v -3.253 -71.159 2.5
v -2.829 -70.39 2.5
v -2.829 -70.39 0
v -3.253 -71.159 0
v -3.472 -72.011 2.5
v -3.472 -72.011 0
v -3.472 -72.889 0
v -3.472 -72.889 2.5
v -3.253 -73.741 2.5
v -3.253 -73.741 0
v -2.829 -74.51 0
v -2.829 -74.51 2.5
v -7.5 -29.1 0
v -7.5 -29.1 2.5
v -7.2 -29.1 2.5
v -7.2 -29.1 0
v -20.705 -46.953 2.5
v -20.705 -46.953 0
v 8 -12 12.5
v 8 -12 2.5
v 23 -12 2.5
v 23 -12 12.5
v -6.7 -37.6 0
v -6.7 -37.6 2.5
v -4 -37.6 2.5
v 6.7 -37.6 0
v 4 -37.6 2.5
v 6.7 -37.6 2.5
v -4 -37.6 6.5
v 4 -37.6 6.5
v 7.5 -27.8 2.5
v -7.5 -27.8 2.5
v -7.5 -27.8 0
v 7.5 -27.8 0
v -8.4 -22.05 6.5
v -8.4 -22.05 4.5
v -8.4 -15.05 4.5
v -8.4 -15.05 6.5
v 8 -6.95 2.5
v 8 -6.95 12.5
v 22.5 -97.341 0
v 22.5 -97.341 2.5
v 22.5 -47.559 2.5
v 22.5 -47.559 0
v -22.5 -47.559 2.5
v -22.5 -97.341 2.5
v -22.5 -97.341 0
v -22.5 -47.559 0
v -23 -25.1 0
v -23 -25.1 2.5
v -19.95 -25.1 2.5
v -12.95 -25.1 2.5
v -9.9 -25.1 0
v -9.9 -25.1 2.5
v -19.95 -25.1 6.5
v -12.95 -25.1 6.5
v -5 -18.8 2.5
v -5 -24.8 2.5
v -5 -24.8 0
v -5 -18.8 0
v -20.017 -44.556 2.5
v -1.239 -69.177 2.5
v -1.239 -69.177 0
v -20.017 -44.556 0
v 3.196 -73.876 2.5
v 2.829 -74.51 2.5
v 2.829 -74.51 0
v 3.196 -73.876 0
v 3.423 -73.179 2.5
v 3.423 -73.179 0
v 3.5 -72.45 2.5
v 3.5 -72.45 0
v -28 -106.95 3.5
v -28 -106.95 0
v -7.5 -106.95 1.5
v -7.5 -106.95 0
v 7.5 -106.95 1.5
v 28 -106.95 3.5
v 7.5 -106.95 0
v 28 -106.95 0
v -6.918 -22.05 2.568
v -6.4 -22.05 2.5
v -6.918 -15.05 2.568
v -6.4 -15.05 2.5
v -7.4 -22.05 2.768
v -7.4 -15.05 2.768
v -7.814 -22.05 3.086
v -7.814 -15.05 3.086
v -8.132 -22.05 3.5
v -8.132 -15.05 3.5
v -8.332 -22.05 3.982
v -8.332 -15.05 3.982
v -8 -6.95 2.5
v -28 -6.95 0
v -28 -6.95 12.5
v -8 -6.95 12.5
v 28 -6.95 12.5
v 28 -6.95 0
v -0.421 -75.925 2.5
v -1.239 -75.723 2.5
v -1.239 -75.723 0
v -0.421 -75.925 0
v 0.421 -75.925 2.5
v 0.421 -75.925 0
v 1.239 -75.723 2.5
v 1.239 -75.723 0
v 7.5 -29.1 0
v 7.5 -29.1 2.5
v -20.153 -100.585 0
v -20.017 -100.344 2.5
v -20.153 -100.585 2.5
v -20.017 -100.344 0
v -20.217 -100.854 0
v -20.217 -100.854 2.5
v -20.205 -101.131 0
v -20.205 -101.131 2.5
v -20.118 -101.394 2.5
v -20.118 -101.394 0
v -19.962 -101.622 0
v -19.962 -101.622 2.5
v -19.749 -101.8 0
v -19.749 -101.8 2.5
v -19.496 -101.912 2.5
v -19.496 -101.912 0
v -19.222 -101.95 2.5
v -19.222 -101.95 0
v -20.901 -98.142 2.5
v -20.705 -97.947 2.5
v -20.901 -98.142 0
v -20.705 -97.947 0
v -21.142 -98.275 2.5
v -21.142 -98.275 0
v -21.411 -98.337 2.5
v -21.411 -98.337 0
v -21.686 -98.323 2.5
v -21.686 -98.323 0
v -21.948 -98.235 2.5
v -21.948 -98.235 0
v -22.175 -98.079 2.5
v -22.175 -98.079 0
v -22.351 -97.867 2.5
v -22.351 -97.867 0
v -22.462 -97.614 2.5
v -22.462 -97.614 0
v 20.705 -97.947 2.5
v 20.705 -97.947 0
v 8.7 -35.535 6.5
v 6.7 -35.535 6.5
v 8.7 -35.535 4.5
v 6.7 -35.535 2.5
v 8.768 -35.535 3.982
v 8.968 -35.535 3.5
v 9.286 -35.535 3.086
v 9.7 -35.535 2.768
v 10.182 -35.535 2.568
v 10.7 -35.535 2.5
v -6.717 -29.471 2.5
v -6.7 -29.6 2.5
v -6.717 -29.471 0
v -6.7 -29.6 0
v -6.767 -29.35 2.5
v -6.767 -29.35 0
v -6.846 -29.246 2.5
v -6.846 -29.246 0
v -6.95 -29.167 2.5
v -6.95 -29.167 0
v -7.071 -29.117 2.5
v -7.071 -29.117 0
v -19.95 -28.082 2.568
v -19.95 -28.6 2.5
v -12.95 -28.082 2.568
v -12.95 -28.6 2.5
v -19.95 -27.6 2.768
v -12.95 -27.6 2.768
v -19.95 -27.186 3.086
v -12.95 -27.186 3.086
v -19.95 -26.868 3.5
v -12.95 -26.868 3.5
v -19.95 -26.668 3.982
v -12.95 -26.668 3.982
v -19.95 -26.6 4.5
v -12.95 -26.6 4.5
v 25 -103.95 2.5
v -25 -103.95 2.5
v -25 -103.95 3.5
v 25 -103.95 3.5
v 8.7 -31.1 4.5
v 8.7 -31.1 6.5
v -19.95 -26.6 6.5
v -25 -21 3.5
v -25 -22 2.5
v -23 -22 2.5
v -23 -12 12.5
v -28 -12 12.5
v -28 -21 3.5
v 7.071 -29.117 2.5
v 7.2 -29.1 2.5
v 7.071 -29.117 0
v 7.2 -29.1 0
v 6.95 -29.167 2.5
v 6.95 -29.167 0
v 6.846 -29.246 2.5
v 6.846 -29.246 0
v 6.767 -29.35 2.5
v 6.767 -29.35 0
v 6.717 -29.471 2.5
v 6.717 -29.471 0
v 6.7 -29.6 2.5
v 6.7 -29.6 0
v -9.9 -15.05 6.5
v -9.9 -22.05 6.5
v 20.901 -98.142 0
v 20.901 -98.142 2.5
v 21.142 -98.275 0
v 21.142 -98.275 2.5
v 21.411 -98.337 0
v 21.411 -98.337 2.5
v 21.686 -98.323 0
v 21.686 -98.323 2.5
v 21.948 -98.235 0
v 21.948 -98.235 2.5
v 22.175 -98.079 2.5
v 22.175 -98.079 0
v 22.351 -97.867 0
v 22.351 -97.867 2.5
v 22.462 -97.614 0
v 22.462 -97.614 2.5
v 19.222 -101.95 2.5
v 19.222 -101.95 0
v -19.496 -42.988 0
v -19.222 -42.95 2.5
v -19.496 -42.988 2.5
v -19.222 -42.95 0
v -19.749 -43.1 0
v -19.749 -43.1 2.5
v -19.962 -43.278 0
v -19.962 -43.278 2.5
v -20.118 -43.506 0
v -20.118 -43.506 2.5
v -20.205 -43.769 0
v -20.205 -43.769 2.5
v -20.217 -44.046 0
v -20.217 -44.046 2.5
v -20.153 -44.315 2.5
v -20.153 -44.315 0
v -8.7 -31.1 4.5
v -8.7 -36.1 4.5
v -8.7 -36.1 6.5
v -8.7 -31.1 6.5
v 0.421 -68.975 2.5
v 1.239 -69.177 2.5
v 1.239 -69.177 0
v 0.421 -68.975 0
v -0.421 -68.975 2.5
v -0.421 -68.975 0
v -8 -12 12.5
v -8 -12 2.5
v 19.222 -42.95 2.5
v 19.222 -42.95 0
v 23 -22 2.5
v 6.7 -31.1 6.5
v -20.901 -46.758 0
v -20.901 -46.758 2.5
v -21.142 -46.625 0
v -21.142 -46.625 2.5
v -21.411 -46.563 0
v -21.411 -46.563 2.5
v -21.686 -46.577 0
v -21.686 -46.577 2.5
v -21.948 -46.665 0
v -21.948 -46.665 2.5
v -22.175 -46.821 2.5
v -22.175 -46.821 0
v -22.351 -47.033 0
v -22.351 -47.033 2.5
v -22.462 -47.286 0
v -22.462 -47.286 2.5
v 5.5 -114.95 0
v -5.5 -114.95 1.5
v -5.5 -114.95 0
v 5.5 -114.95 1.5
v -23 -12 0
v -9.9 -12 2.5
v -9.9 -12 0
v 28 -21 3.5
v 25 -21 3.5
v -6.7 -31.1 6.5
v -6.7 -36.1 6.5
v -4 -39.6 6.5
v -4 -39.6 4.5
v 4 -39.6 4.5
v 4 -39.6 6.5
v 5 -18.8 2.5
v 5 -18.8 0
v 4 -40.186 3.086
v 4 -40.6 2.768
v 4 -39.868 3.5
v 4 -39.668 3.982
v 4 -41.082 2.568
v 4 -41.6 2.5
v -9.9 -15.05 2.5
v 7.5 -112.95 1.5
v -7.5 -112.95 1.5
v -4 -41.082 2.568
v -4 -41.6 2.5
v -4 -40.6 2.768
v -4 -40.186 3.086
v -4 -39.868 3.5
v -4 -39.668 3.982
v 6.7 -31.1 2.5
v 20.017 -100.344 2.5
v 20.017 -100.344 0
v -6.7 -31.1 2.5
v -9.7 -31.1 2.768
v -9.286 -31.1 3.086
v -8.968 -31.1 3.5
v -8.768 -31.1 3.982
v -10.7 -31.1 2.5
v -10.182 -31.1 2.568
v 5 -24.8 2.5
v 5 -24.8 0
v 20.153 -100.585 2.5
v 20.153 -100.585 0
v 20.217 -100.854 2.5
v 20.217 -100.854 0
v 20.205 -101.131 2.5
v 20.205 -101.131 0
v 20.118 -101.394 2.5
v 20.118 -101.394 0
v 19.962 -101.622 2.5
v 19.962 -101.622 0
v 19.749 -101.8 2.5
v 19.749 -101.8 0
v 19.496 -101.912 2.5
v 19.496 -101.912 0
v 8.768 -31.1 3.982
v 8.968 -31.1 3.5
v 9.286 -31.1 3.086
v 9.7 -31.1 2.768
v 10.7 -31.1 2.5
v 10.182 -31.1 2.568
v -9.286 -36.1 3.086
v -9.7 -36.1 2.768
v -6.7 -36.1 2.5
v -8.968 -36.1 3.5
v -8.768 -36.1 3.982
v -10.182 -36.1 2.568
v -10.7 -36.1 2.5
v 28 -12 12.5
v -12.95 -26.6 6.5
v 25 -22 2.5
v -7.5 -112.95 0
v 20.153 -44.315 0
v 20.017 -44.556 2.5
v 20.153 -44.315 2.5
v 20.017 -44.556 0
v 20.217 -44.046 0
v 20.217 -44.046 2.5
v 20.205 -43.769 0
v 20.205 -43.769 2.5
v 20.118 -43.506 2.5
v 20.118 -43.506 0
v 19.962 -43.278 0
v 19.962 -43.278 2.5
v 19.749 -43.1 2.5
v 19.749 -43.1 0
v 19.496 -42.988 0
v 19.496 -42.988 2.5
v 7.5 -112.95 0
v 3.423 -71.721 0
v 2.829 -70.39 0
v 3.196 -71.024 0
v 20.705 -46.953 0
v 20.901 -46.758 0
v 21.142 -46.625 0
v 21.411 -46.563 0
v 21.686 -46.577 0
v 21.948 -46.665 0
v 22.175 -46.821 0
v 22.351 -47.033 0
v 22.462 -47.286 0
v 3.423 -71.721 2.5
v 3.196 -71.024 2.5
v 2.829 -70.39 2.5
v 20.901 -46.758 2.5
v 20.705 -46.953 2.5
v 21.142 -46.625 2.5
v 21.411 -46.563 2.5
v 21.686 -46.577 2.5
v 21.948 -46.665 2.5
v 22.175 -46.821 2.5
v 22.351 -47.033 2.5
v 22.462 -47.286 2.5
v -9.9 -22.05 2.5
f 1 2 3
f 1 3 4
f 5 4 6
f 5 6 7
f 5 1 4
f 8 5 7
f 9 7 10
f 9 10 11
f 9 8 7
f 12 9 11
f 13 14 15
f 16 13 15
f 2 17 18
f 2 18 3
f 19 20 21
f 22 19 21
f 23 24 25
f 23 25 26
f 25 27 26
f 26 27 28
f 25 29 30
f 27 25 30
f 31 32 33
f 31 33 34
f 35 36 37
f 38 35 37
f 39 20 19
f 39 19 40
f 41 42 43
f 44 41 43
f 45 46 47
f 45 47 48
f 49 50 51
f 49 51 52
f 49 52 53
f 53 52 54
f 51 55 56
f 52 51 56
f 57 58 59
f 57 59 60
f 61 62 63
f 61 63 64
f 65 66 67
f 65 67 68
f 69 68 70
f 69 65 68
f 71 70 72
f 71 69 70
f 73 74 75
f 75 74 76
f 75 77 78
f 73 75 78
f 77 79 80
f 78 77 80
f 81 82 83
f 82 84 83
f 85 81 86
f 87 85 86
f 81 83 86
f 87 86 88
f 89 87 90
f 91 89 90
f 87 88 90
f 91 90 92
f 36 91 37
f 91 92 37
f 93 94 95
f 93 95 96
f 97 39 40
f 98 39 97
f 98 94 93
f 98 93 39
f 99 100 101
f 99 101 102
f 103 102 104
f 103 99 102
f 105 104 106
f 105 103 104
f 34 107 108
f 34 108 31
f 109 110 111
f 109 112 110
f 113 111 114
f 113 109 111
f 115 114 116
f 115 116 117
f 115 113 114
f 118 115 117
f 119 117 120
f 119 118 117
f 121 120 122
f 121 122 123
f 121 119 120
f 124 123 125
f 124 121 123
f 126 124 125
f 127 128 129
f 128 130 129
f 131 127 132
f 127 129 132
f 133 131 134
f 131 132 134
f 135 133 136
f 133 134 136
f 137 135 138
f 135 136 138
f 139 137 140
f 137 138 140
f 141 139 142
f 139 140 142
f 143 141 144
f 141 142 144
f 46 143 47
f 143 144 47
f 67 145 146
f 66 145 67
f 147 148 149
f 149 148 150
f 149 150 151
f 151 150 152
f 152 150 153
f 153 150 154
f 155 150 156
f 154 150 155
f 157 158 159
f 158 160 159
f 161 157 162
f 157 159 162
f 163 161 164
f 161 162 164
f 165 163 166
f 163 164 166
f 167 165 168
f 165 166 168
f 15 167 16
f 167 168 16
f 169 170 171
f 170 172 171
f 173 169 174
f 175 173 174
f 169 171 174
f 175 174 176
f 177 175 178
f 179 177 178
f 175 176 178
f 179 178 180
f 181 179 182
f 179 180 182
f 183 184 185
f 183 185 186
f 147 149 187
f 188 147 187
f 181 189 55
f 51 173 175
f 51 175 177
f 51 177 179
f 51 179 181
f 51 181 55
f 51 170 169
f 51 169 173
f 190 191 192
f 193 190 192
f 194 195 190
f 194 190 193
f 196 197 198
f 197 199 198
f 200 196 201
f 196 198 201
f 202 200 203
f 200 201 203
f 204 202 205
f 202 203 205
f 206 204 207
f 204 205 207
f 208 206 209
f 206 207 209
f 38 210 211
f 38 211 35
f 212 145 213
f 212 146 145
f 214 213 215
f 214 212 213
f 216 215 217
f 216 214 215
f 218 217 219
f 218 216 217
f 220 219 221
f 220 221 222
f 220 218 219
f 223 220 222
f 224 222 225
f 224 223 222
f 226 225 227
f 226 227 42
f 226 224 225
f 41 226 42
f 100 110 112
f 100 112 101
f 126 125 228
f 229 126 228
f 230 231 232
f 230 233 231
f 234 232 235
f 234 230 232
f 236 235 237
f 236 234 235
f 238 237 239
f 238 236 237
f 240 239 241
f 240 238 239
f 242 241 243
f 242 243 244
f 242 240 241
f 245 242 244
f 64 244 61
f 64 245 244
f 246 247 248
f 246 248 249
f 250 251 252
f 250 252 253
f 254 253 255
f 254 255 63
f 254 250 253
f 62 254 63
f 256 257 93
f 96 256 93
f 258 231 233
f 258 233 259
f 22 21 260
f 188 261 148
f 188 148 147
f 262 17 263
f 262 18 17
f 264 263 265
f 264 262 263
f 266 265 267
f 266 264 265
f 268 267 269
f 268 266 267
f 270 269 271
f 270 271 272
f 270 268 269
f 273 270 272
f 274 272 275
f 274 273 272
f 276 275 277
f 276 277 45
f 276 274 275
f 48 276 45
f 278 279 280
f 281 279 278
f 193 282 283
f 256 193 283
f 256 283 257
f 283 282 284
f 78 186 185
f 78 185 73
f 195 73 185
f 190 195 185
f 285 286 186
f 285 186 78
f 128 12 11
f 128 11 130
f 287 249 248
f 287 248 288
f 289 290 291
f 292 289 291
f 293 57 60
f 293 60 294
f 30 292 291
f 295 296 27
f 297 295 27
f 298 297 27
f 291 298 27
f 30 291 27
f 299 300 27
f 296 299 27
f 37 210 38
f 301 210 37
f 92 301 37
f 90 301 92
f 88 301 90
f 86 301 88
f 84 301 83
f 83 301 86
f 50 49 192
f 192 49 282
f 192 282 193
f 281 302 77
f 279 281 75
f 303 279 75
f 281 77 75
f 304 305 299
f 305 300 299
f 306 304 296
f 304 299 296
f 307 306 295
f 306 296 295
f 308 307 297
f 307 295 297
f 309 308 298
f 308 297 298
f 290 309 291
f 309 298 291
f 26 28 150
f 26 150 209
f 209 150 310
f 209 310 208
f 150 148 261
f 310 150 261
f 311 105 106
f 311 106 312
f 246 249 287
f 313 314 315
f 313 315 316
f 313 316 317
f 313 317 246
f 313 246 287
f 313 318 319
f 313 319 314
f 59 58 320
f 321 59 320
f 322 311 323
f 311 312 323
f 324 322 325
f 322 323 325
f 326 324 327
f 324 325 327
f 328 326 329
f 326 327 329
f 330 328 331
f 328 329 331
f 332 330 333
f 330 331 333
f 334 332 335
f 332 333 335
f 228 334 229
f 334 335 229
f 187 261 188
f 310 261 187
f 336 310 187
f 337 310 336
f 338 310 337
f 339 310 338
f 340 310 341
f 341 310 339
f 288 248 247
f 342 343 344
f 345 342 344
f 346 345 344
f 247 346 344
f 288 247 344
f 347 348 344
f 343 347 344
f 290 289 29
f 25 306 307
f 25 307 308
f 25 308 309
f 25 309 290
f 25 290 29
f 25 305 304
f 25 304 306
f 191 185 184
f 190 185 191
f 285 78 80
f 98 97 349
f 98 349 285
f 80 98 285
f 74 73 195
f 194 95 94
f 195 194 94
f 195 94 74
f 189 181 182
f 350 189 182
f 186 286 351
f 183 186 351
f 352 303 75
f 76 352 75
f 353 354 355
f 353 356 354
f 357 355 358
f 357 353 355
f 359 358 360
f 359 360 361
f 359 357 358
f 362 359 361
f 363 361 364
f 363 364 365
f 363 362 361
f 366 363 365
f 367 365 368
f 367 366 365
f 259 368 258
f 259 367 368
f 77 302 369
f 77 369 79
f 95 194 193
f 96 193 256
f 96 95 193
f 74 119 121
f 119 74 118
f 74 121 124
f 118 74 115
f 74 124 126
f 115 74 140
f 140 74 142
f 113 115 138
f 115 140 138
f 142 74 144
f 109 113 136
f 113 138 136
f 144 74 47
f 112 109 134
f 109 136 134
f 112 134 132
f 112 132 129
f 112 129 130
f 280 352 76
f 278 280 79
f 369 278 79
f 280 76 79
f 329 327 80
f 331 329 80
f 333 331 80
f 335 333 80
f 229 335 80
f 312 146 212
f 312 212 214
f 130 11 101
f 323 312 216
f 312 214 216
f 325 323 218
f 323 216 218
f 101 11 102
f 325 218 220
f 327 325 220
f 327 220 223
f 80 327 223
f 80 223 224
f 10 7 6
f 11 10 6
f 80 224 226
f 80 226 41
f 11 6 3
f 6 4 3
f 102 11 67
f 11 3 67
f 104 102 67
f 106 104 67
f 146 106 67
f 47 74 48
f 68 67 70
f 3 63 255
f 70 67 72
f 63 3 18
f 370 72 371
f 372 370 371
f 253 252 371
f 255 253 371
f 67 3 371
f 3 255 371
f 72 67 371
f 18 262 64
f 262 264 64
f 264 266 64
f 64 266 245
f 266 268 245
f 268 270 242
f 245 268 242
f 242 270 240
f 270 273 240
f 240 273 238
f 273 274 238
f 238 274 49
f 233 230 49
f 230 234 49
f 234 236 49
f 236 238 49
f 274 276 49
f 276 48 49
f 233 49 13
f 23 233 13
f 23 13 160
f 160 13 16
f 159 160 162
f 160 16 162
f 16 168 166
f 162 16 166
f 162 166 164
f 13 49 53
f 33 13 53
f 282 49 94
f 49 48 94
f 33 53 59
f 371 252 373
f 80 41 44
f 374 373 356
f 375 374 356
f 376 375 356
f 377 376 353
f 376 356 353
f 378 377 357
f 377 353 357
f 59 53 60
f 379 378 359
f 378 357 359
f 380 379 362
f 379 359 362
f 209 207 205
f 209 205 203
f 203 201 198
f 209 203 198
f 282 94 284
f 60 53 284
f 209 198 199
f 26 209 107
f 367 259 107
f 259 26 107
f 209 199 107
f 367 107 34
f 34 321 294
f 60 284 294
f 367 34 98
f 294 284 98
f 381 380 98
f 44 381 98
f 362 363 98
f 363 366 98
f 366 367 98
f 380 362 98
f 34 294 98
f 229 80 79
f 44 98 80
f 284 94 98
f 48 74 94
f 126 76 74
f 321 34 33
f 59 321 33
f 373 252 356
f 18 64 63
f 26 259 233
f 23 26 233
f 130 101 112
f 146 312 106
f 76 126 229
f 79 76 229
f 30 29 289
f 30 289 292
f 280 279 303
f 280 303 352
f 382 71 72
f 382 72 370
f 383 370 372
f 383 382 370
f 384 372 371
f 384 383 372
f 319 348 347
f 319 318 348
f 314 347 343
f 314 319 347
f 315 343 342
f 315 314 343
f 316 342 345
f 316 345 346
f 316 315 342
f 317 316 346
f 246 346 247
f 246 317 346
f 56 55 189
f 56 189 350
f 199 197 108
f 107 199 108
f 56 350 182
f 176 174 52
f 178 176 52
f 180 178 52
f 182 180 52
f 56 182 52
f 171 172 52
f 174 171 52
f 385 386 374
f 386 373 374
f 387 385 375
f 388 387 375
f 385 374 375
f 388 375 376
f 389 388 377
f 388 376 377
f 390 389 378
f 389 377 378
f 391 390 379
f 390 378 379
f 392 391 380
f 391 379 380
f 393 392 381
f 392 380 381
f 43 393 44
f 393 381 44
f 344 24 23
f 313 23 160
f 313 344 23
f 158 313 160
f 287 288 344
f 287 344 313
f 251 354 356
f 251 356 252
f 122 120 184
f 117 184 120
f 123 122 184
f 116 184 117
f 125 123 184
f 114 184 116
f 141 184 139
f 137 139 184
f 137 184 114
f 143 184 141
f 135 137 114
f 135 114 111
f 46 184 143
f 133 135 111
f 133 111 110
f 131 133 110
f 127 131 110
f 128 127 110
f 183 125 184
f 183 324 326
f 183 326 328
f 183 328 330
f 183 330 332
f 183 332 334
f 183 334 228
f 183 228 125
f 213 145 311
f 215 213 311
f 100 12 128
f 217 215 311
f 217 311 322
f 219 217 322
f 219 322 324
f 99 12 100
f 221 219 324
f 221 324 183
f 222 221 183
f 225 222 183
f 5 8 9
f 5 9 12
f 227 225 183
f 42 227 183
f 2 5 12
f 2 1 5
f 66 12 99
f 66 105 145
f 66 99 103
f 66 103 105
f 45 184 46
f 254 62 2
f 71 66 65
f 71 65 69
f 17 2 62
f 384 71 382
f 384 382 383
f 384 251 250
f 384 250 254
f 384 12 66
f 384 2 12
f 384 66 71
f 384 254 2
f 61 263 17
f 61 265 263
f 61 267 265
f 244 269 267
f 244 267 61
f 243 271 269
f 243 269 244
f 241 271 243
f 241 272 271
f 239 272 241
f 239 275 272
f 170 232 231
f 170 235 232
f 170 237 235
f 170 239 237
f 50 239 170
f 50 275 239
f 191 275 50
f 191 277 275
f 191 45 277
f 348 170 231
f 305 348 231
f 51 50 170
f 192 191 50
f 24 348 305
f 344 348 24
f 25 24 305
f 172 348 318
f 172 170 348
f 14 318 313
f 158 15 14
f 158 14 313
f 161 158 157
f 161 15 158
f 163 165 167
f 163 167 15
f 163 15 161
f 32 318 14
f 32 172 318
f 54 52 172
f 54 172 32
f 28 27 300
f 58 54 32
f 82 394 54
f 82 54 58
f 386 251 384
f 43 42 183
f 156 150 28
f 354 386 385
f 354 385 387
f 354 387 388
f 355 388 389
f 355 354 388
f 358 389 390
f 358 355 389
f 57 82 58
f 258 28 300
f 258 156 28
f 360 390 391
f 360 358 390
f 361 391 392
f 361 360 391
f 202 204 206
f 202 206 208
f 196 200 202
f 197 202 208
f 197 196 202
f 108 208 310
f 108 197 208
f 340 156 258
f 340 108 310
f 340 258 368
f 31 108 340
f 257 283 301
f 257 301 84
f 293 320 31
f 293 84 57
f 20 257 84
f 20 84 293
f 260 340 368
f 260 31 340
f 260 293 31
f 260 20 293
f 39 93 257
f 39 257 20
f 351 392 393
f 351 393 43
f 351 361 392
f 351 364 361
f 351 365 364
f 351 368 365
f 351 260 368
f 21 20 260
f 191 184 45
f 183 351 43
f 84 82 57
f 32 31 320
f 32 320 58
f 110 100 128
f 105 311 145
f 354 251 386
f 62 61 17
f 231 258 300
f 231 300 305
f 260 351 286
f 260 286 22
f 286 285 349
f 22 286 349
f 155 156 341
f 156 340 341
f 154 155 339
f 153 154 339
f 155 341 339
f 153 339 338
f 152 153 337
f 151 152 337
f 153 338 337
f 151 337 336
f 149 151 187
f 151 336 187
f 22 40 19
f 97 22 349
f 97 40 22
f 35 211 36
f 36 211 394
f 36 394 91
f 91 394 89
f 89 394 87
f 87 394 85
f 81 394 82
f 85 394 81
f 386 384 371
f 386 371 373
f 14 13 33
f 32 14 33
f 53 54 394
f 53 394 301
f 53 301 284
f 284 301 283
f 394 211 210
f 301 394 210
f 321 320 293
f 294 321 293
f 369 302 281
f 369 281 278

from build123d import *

# Parameters (mm, degrees)
SKETCH1_W            = 56
SKETCH1_H            = 100
BOSS_EXTRUDE1_DEPTH  = 2.5
SKETCH2_W            = 20
SKETCH2_H            = 5.05
BOSS_EXTRUDE2_DEPTH  = 10
SKETCH3_W            = 13.1
SKETCH3_H            = 13.1
CUT_EXTRUDE1_DEPTH   = 112.005866962
BOSS_EXTRUDE3_DEPTH  = 5
BOSS_EXTRUDE4_DEPTH  = 5
SKETCH6_W            = 7
SKETCH6_H            = 1.5
SKETCH6_W_2          = 1.5
SKETCH6_H_2          = 7
BOSS_EXTRUDE5_DEPTH  = 4
SKETCH7_W            = 15
SKETCH7_H            = 1.3
CUT_EXTRUDE2_DEPTH   = 112.005866962
SKETCH8_W            = 13.4
SKETCH8_H            = 8.5
SKETCH8_W_2          = 10
SKETCH8_H_2          = 6
CUT_EXTRUDE3_DEPTH   = 112.005866962
FILLET1_R            = 2
SKETCH9_W            = 15
SKETCH9_H            = 8
BOSS_EXTRUDE6_DEPTH  = 2.5
CHAMFER1_SIZE        = 2
SKETCH10_W           = 45
SKETCH10_H           = 59
CUT_EXTRUDE4_DEPTH   = 4
BOSS_EXTRUDE7_DEPTH  = 2.5
FILLET2_R            = 1
FILLET3_R            = 0.5
CUT_EXTRUDE5_DEPTH   = 1
SKETCH13_W           = 1
SKETCH13_H           = 88
BOSS_EXTRUDE8_DEPTH  = 3
BOSS_EXTRUDE9_DEPTH  = 3
SKETCH15_W           = 50
SKETCH15_H           = 3
BOSS_EXTRUDE10_DEPTH = 1
SKETCH16_W           = 2
SKETCH16_H           = 5
SKETCH16_W_2         = 8
SKETCH16_H_2         = 2
SKETCH16_H_3         = 4.4346707
BOSS_EXTRUDE11_DEPTH = 4
FILLET4_R            = 2


with BuildPart() as part:
    # Sketch1 → Boss-Extrude1 (new body)
    with BuildSketch(Plane.XY):
        with Locations((0, -56.95)):
            Rectangle(SKETCH1_W, SKETCH1_H)
    extrude(amount=BOSS_EXTRUDE1_DEPTH)

    # Sketch2 → Boss-Extrude2 (add)
    with BuildSketch(Plane.XY.offset(2.5)):
        with Locations((-18, -9.475)):
            Rectangle(SKETCH2_W, SKETCH2_H)
        with Locations((18, -9.475)):
            Rectangle(SKETCH2_W, SKETCH2_H)
    extrude(amount=BOSS_EXTRUDE2_DEPTH)

    # Sketch3 → Cut-Extrude1 (cut, through all)
    with BuildSketch(Plane.XY.offset(2.5)):
        with Locations((-16.45, -18.55)):
            Rectangle(SKETCH3_W, SKETCH3_H)
    extrude(amount=-CUT_EXTRUDE1_DEPTH, mode=Mode.SUBTRACT)

    # Sketch4 → Boss-Extrude3 (add)
    with BuildSketch(Plane(origin=(28, 0, 0), x_dir=(0, 0, -1), z_dir=(1, 0, 0))):
        Polygon((-12.5, -12), (-2.5, -12), (-2.5, -22), align=None)
    extrude(amount=-BOSS_EXTRUDE3_DEPTH)

    # Sketch5 → Boss-Extrude4 (add)
    with BuildSketch(Plane.ZY.offset(28)):
        Polygon((2.5, -22), (12.5, -12), (2.5, -12), align=None)
    extrude(amount=-BOSS_EXTRUDE4_DEPTH)

    # Sketch6 → Boss-Extrude5 (add)
    with BuildSketch(Plane.XY.offset(2.5)):
        with Locations((-16.45, -25.85)):
            Rectangle(SKETCH6_W, SKETCH6_H)
        with Locations((-9.15, -18.55)):
            Rectangle(SKETCH6_W_2, SKETCH6_H_2)
    extrude(amount=BOSS_EXTRUDE5_DEPTH)

    # Sketch7 → Cut-Extrude2 (cut, through all)
    with BuildSketch(Plane.XY.offset(2.5)):
        with Locations((0, -28.45)):
            Rectangle(SKETCH7_W, SKETCH7_H)
    extrude(amount=-CUT_EXTRUDE2_DEPTH, mode=Mode.SUBTRACT)

    # Sketch8 → Cut-Extrude3 (cut, through all)
    with BuildSketch(Plane.XY.offset(2.5)):
        with Locations((0, -33.35)):
            Rectangle(SKETCH8_W, SKETCH8_H)
        with Locations((0, -21.8)):
            Rectangle(SKETCH8_W_2, SKETCH8_H_2)
    extrude(amount=-CUT_EXTRUDE3_DEPTH, mode=Mode.SUBTRACT)

    # Fillet1
    fillet1_edges = [part.edges().sort_by_distance(p)[0] for p in [
        (-16.45, -26.6, 2.5),
        (-8.4, -18.55, 2.5),
    ]]
    fillet(fillet1_edges, radius=FILLET1_R)

    # Sketch9 → Boss-Extrude6 (add)
    with BuildSketch(Plane.XY.offset(2.5)):
        with Locations((0, -110.95)):
            Rectangle(SKETCH9_W, SKETCH9_H)
    extrude(amount=-BOSS_EXTRUDE6_DEPTH)

    # Chamfer1
    chamfer1_edges = [part.edges().sort_by_distance(p)[0] for p in [
        (-7.5, -114.95, 1.25),
        (7.5, -114.95, 1.25),
    ]]
    chamfer(chamfer1_edges, length=CHAMFER1_SIZE)

    # Sketch10 → Cut-Extrude4 (cut)
    with BuildSketch(Plane.XY.offset(2.5)):
        with Locations((0, -72.45)):
            Rectangle(SKETCH10_W, SKETCH10_H)
    extrude(amount=-CUT_EXTRUDE4_DEPTH, mode=Mode.SUBTRACT)

    # Sketch11 → Boss-Extrude7 (add)
    with BuildSketch(Plane.XY.offset(2.5)):
        with BuildLine():
            Line((-21.242331765, -42.95), (-22.5, -42.95))
            Line((-22.5, -42.95), (-22.5, -44.598942796))
            Line((-22.5, -44.598942796), (-2.829214626, -70.389528064))
            ThreePointArc((-2.829214626, -70.389528064), (-2.122572116, -69.667072115), (-1.238970121, -69.176629712))
            Line((-1.238970121, -69.176629712), (-21.242331765, -42.95))
        make_face()
        with BuildLine():
            Line((22.5, -42.95), (21.242331765, -42.95))
            Line((21.242331765, -42.95), (1.238970121, -69.176629712))
            ThreePointArc((1.238970121, -69.176629712), (2.122572116, -69.667072115), (2.829214626, -70.389528064))
            Line((2.829214626, -70.389528064), (22.5, -44.598942796))
            Line((22.5, -44.598942796), (22.5, -42.95))
        make_face()
        with BuildLine():
            Line((22.5, -100.301057204), (2.829214626, -74.510471936))
            ThreePointArc((2.829214626, -74.510471936), (2.122572116, -75.232927885), (1.238970121, -75.723370288))
            Line((1.238970121, -75.723370288), (21.242331765, -101.95))
            Line((21.242331765, -101.95), (22.5, -101.95))
            Line((22.5, -101.95), (22.5, -100.301057204))
        make_face()
        with BuildLine():
            Line((-2.829214626, -74.510471936), (-22.5, -100.301057204))
            Line((-22.5, -100.301057204), (-22.5, -101.95))
            Line((-22.5, -101.95), (-21.242331765, -101.95))
            Line((-21.242331765, -101.95), (-1.238970121, -75.723370288))
            ThreePointArc((-1.238970121, -75.723370288), (-2.122572116, -75.232927885), (-2.829214626, -74.510471936))
        make_face()
        with BuildLine():
            Line((-1.257668235, -72.45), (-2.829214626, -70.389528064))
            ThreePointArc((-2.829214626, -70.389528064), (-3.5, -72.45), (-2.829214626, -74.510471936))
            Line((-2.829214626, -74.510471936), (-1.257668235, -72.45))
        make_face()
        with BuildLine():
            Line((0, -70.801057204), (-1.238970121, -69.176629712))
            ThreePointArc((-1.238970121, -69.176629712), (-2.122572116, -69.667072115), (-2.829214626, -70.389528064))
            Line((-2.829214626, -70.389528064), (-1.257668235, -72.45))
            Line((-1.257668235, -72.45), (0, -70.801057204))
        make_face()
        with BuildLine():
            Line((0, -74.098942796), (-1.257668235, -72.45))
            Line((-1.257668235, -72.45), (-2.829214626, -74.510471936))
            ThreePointArc((-2.829214626, -74.510471936), (-2.122572116, -75.232927885), (-1.238970121, -75.723370288))
            Line((-1.238970121, -75.723370288), (0, -74.098942796))
        make_face()
        with BuildLine():
            Line((1.238970121, -75.723370288), (0, -74.098942796))
            Line((0, -74.098942796), (-1.238970121, -75.723370288))
            ThreePointArc((-1.238970121, -75.723370288), (0, -75.95), (1.238970121, -75.723370288))
        make_face()
        with BuildLine():
            Line((2.829214626, -70.389528064), (1.257668235, -72.45))
            Line((1.257668235, -72.45), (2.829214626, -74.510471936))
            ThreePointArc((2.829214626, -74.510471936), (3.328081369, -73.533454846), (3.5, -72.45))
            ThreePointArc((3.5, -72.45), (3.328081369, -71.366545154), (2.829214626, -70.389528064))
        make_face()
        with BuildLine():
            Line((2.829214626, -74.510471936), (1.257668235, -72.45))
            Line((1.257668235, -72.45), (0, -74.098942796))
            Line((0, -74.098942796), (1.238970121, -75.723370288))
            ThreePointArc((1.238970121, -75.723370288), (2.122572116, -75.232927885), (2.829214626, -74.510471936))
        make_face()
        with BuildLine():
            Line((1.238970121, -69.176629712), (0, -70.801057204))
            Line((0, -70.801057204), (1.257668235, -72.45))
            Line((1.257668235, -72.45), (2.829214626, -70.389528064))
            ThreePointArc((2.829214626, -70.389528064), (2.122572116, -69.667072115), (1.238970121, -69.176629712))
        make_face()
        with BuildLine():
            ThreePointArc((1.238970121, -69.176629712), (0, -68.95), (-1.238970121, -69.176629712))
            Line((-1.238970121, -69.176629712), (0, -70.801057204))
            Line((0, -70.801057204), (1.238970121, -69.176629712))
        make_face()
        Polygon((1.257668235, -72.45), (0, -70.801057204), (-1.257668235, -72.45), (0, -74.098942796), align=None)
    extrude(amount=-BOSS_EXTRUDE7_DEPTH)

    # Fillet2
    fillet2_edges = [part.edges().sort_by_distance(p)[0] for p in [
        (-22.5, -100.301057204, 1.25),
        (-21.242331765, -101.95, 1.25),
        (21.242331765, -101.95, 1.25),
        (22.5, -100.301057204, 1.25),
        (22.5, -44.598942796, 1.25),
        (21.242331765, -42.95, 1.25),
        (-21.242331765, -42.95, 1.25),
        (-22.5, -44.598942796, 1.25),
    ]]
    fillet(fillet2_edges, radius=FILLET2_R)

    # Fillet3
    fillet3_edges = [part.edges().sort_by_distance(p)[0] for p in [
        (6.7, -29.1, 1.25),
        (-6.7, -29.1, 1.25),
    ]]
    fillet(fillet3_edges, radius=FILLET3_R)

    # Sketch12 → Cut-Extrude5 (cut)
    with BuildSketch(Plane.XY.offset(2.5)):
        Polygon((-7.5, -106.95), (7.5, -106.95), (7.5, -112.95), (5.5, -114.95), (-5.5, -114.95), (-7.5, -112.95), align=None)
    extrude(amount=-CUT_EXTRUDE5_DEPTH, mode=Mode.SUBTRACT)

    # Sketch13 → Boss-Extrude8 (add)
    with BuildSketch(Plane(origin=(28, 0, 0), x_dir=(0, 0, -1), z_dir=(1, 0, 0))):
        with Locations((-3, -62.95)):
            Rectangle(SKETCH13_W, SKETCH13_H)
    extrude(amount=-BOSS_EXTRUDE8_DEPTH)

    # Sketch14 → Boss-Extrude9 (add)
    with BuildSketch(Plane.ZY.offset(28)):
        Polygon((3.5, -21), (3.5, -106.95), (2.5, -106.95), (2.5, -22), align=None)
    extrude(amount=-BOSS_EXTRUDE9_DEPTH)

    # Sketch15 → Boss-Extrude10 (add)
    with BuildSketch(Plane.XY.offset(2.5)):
        with Locations((0, -105.45)):
            Rectangle(SKETCH15_W, SKETCH15_H)
    extrude(amount=BOSS_EXTRUDE10_DEPTH)

    # Sketch16 → Boss-Extrude11 (add)
    with BuildSketch(Plane.XY.offset(2.5)):
        with Locations((-7.7, -33.6)):
            Rectangle(SKETCH16_W, SKETCH16_H)
        with Locations((0, -38.6)):
            Rectangle(SKETCH16_W_2, SKETCH16_H_2)
        with Locations((7.7, -33.31733535)):
            Rectangle(SKETCH16_W, SKETCH16_H_3)
    extrude(amount=BOSS_EXTRUDE11_DEPTH)

    # Fillet4
    fillet4_edges = [part.edges().sort_by_distance(p)[0] for p in [
        (-8.7, -33.6, 2.5),
        (0, -39.6, 2.5),
        (8.7, -33.31733535, 2.5),
    ]]
    fillet(fillet4_edges, radius=FILLET4_R)


solid = part.part
